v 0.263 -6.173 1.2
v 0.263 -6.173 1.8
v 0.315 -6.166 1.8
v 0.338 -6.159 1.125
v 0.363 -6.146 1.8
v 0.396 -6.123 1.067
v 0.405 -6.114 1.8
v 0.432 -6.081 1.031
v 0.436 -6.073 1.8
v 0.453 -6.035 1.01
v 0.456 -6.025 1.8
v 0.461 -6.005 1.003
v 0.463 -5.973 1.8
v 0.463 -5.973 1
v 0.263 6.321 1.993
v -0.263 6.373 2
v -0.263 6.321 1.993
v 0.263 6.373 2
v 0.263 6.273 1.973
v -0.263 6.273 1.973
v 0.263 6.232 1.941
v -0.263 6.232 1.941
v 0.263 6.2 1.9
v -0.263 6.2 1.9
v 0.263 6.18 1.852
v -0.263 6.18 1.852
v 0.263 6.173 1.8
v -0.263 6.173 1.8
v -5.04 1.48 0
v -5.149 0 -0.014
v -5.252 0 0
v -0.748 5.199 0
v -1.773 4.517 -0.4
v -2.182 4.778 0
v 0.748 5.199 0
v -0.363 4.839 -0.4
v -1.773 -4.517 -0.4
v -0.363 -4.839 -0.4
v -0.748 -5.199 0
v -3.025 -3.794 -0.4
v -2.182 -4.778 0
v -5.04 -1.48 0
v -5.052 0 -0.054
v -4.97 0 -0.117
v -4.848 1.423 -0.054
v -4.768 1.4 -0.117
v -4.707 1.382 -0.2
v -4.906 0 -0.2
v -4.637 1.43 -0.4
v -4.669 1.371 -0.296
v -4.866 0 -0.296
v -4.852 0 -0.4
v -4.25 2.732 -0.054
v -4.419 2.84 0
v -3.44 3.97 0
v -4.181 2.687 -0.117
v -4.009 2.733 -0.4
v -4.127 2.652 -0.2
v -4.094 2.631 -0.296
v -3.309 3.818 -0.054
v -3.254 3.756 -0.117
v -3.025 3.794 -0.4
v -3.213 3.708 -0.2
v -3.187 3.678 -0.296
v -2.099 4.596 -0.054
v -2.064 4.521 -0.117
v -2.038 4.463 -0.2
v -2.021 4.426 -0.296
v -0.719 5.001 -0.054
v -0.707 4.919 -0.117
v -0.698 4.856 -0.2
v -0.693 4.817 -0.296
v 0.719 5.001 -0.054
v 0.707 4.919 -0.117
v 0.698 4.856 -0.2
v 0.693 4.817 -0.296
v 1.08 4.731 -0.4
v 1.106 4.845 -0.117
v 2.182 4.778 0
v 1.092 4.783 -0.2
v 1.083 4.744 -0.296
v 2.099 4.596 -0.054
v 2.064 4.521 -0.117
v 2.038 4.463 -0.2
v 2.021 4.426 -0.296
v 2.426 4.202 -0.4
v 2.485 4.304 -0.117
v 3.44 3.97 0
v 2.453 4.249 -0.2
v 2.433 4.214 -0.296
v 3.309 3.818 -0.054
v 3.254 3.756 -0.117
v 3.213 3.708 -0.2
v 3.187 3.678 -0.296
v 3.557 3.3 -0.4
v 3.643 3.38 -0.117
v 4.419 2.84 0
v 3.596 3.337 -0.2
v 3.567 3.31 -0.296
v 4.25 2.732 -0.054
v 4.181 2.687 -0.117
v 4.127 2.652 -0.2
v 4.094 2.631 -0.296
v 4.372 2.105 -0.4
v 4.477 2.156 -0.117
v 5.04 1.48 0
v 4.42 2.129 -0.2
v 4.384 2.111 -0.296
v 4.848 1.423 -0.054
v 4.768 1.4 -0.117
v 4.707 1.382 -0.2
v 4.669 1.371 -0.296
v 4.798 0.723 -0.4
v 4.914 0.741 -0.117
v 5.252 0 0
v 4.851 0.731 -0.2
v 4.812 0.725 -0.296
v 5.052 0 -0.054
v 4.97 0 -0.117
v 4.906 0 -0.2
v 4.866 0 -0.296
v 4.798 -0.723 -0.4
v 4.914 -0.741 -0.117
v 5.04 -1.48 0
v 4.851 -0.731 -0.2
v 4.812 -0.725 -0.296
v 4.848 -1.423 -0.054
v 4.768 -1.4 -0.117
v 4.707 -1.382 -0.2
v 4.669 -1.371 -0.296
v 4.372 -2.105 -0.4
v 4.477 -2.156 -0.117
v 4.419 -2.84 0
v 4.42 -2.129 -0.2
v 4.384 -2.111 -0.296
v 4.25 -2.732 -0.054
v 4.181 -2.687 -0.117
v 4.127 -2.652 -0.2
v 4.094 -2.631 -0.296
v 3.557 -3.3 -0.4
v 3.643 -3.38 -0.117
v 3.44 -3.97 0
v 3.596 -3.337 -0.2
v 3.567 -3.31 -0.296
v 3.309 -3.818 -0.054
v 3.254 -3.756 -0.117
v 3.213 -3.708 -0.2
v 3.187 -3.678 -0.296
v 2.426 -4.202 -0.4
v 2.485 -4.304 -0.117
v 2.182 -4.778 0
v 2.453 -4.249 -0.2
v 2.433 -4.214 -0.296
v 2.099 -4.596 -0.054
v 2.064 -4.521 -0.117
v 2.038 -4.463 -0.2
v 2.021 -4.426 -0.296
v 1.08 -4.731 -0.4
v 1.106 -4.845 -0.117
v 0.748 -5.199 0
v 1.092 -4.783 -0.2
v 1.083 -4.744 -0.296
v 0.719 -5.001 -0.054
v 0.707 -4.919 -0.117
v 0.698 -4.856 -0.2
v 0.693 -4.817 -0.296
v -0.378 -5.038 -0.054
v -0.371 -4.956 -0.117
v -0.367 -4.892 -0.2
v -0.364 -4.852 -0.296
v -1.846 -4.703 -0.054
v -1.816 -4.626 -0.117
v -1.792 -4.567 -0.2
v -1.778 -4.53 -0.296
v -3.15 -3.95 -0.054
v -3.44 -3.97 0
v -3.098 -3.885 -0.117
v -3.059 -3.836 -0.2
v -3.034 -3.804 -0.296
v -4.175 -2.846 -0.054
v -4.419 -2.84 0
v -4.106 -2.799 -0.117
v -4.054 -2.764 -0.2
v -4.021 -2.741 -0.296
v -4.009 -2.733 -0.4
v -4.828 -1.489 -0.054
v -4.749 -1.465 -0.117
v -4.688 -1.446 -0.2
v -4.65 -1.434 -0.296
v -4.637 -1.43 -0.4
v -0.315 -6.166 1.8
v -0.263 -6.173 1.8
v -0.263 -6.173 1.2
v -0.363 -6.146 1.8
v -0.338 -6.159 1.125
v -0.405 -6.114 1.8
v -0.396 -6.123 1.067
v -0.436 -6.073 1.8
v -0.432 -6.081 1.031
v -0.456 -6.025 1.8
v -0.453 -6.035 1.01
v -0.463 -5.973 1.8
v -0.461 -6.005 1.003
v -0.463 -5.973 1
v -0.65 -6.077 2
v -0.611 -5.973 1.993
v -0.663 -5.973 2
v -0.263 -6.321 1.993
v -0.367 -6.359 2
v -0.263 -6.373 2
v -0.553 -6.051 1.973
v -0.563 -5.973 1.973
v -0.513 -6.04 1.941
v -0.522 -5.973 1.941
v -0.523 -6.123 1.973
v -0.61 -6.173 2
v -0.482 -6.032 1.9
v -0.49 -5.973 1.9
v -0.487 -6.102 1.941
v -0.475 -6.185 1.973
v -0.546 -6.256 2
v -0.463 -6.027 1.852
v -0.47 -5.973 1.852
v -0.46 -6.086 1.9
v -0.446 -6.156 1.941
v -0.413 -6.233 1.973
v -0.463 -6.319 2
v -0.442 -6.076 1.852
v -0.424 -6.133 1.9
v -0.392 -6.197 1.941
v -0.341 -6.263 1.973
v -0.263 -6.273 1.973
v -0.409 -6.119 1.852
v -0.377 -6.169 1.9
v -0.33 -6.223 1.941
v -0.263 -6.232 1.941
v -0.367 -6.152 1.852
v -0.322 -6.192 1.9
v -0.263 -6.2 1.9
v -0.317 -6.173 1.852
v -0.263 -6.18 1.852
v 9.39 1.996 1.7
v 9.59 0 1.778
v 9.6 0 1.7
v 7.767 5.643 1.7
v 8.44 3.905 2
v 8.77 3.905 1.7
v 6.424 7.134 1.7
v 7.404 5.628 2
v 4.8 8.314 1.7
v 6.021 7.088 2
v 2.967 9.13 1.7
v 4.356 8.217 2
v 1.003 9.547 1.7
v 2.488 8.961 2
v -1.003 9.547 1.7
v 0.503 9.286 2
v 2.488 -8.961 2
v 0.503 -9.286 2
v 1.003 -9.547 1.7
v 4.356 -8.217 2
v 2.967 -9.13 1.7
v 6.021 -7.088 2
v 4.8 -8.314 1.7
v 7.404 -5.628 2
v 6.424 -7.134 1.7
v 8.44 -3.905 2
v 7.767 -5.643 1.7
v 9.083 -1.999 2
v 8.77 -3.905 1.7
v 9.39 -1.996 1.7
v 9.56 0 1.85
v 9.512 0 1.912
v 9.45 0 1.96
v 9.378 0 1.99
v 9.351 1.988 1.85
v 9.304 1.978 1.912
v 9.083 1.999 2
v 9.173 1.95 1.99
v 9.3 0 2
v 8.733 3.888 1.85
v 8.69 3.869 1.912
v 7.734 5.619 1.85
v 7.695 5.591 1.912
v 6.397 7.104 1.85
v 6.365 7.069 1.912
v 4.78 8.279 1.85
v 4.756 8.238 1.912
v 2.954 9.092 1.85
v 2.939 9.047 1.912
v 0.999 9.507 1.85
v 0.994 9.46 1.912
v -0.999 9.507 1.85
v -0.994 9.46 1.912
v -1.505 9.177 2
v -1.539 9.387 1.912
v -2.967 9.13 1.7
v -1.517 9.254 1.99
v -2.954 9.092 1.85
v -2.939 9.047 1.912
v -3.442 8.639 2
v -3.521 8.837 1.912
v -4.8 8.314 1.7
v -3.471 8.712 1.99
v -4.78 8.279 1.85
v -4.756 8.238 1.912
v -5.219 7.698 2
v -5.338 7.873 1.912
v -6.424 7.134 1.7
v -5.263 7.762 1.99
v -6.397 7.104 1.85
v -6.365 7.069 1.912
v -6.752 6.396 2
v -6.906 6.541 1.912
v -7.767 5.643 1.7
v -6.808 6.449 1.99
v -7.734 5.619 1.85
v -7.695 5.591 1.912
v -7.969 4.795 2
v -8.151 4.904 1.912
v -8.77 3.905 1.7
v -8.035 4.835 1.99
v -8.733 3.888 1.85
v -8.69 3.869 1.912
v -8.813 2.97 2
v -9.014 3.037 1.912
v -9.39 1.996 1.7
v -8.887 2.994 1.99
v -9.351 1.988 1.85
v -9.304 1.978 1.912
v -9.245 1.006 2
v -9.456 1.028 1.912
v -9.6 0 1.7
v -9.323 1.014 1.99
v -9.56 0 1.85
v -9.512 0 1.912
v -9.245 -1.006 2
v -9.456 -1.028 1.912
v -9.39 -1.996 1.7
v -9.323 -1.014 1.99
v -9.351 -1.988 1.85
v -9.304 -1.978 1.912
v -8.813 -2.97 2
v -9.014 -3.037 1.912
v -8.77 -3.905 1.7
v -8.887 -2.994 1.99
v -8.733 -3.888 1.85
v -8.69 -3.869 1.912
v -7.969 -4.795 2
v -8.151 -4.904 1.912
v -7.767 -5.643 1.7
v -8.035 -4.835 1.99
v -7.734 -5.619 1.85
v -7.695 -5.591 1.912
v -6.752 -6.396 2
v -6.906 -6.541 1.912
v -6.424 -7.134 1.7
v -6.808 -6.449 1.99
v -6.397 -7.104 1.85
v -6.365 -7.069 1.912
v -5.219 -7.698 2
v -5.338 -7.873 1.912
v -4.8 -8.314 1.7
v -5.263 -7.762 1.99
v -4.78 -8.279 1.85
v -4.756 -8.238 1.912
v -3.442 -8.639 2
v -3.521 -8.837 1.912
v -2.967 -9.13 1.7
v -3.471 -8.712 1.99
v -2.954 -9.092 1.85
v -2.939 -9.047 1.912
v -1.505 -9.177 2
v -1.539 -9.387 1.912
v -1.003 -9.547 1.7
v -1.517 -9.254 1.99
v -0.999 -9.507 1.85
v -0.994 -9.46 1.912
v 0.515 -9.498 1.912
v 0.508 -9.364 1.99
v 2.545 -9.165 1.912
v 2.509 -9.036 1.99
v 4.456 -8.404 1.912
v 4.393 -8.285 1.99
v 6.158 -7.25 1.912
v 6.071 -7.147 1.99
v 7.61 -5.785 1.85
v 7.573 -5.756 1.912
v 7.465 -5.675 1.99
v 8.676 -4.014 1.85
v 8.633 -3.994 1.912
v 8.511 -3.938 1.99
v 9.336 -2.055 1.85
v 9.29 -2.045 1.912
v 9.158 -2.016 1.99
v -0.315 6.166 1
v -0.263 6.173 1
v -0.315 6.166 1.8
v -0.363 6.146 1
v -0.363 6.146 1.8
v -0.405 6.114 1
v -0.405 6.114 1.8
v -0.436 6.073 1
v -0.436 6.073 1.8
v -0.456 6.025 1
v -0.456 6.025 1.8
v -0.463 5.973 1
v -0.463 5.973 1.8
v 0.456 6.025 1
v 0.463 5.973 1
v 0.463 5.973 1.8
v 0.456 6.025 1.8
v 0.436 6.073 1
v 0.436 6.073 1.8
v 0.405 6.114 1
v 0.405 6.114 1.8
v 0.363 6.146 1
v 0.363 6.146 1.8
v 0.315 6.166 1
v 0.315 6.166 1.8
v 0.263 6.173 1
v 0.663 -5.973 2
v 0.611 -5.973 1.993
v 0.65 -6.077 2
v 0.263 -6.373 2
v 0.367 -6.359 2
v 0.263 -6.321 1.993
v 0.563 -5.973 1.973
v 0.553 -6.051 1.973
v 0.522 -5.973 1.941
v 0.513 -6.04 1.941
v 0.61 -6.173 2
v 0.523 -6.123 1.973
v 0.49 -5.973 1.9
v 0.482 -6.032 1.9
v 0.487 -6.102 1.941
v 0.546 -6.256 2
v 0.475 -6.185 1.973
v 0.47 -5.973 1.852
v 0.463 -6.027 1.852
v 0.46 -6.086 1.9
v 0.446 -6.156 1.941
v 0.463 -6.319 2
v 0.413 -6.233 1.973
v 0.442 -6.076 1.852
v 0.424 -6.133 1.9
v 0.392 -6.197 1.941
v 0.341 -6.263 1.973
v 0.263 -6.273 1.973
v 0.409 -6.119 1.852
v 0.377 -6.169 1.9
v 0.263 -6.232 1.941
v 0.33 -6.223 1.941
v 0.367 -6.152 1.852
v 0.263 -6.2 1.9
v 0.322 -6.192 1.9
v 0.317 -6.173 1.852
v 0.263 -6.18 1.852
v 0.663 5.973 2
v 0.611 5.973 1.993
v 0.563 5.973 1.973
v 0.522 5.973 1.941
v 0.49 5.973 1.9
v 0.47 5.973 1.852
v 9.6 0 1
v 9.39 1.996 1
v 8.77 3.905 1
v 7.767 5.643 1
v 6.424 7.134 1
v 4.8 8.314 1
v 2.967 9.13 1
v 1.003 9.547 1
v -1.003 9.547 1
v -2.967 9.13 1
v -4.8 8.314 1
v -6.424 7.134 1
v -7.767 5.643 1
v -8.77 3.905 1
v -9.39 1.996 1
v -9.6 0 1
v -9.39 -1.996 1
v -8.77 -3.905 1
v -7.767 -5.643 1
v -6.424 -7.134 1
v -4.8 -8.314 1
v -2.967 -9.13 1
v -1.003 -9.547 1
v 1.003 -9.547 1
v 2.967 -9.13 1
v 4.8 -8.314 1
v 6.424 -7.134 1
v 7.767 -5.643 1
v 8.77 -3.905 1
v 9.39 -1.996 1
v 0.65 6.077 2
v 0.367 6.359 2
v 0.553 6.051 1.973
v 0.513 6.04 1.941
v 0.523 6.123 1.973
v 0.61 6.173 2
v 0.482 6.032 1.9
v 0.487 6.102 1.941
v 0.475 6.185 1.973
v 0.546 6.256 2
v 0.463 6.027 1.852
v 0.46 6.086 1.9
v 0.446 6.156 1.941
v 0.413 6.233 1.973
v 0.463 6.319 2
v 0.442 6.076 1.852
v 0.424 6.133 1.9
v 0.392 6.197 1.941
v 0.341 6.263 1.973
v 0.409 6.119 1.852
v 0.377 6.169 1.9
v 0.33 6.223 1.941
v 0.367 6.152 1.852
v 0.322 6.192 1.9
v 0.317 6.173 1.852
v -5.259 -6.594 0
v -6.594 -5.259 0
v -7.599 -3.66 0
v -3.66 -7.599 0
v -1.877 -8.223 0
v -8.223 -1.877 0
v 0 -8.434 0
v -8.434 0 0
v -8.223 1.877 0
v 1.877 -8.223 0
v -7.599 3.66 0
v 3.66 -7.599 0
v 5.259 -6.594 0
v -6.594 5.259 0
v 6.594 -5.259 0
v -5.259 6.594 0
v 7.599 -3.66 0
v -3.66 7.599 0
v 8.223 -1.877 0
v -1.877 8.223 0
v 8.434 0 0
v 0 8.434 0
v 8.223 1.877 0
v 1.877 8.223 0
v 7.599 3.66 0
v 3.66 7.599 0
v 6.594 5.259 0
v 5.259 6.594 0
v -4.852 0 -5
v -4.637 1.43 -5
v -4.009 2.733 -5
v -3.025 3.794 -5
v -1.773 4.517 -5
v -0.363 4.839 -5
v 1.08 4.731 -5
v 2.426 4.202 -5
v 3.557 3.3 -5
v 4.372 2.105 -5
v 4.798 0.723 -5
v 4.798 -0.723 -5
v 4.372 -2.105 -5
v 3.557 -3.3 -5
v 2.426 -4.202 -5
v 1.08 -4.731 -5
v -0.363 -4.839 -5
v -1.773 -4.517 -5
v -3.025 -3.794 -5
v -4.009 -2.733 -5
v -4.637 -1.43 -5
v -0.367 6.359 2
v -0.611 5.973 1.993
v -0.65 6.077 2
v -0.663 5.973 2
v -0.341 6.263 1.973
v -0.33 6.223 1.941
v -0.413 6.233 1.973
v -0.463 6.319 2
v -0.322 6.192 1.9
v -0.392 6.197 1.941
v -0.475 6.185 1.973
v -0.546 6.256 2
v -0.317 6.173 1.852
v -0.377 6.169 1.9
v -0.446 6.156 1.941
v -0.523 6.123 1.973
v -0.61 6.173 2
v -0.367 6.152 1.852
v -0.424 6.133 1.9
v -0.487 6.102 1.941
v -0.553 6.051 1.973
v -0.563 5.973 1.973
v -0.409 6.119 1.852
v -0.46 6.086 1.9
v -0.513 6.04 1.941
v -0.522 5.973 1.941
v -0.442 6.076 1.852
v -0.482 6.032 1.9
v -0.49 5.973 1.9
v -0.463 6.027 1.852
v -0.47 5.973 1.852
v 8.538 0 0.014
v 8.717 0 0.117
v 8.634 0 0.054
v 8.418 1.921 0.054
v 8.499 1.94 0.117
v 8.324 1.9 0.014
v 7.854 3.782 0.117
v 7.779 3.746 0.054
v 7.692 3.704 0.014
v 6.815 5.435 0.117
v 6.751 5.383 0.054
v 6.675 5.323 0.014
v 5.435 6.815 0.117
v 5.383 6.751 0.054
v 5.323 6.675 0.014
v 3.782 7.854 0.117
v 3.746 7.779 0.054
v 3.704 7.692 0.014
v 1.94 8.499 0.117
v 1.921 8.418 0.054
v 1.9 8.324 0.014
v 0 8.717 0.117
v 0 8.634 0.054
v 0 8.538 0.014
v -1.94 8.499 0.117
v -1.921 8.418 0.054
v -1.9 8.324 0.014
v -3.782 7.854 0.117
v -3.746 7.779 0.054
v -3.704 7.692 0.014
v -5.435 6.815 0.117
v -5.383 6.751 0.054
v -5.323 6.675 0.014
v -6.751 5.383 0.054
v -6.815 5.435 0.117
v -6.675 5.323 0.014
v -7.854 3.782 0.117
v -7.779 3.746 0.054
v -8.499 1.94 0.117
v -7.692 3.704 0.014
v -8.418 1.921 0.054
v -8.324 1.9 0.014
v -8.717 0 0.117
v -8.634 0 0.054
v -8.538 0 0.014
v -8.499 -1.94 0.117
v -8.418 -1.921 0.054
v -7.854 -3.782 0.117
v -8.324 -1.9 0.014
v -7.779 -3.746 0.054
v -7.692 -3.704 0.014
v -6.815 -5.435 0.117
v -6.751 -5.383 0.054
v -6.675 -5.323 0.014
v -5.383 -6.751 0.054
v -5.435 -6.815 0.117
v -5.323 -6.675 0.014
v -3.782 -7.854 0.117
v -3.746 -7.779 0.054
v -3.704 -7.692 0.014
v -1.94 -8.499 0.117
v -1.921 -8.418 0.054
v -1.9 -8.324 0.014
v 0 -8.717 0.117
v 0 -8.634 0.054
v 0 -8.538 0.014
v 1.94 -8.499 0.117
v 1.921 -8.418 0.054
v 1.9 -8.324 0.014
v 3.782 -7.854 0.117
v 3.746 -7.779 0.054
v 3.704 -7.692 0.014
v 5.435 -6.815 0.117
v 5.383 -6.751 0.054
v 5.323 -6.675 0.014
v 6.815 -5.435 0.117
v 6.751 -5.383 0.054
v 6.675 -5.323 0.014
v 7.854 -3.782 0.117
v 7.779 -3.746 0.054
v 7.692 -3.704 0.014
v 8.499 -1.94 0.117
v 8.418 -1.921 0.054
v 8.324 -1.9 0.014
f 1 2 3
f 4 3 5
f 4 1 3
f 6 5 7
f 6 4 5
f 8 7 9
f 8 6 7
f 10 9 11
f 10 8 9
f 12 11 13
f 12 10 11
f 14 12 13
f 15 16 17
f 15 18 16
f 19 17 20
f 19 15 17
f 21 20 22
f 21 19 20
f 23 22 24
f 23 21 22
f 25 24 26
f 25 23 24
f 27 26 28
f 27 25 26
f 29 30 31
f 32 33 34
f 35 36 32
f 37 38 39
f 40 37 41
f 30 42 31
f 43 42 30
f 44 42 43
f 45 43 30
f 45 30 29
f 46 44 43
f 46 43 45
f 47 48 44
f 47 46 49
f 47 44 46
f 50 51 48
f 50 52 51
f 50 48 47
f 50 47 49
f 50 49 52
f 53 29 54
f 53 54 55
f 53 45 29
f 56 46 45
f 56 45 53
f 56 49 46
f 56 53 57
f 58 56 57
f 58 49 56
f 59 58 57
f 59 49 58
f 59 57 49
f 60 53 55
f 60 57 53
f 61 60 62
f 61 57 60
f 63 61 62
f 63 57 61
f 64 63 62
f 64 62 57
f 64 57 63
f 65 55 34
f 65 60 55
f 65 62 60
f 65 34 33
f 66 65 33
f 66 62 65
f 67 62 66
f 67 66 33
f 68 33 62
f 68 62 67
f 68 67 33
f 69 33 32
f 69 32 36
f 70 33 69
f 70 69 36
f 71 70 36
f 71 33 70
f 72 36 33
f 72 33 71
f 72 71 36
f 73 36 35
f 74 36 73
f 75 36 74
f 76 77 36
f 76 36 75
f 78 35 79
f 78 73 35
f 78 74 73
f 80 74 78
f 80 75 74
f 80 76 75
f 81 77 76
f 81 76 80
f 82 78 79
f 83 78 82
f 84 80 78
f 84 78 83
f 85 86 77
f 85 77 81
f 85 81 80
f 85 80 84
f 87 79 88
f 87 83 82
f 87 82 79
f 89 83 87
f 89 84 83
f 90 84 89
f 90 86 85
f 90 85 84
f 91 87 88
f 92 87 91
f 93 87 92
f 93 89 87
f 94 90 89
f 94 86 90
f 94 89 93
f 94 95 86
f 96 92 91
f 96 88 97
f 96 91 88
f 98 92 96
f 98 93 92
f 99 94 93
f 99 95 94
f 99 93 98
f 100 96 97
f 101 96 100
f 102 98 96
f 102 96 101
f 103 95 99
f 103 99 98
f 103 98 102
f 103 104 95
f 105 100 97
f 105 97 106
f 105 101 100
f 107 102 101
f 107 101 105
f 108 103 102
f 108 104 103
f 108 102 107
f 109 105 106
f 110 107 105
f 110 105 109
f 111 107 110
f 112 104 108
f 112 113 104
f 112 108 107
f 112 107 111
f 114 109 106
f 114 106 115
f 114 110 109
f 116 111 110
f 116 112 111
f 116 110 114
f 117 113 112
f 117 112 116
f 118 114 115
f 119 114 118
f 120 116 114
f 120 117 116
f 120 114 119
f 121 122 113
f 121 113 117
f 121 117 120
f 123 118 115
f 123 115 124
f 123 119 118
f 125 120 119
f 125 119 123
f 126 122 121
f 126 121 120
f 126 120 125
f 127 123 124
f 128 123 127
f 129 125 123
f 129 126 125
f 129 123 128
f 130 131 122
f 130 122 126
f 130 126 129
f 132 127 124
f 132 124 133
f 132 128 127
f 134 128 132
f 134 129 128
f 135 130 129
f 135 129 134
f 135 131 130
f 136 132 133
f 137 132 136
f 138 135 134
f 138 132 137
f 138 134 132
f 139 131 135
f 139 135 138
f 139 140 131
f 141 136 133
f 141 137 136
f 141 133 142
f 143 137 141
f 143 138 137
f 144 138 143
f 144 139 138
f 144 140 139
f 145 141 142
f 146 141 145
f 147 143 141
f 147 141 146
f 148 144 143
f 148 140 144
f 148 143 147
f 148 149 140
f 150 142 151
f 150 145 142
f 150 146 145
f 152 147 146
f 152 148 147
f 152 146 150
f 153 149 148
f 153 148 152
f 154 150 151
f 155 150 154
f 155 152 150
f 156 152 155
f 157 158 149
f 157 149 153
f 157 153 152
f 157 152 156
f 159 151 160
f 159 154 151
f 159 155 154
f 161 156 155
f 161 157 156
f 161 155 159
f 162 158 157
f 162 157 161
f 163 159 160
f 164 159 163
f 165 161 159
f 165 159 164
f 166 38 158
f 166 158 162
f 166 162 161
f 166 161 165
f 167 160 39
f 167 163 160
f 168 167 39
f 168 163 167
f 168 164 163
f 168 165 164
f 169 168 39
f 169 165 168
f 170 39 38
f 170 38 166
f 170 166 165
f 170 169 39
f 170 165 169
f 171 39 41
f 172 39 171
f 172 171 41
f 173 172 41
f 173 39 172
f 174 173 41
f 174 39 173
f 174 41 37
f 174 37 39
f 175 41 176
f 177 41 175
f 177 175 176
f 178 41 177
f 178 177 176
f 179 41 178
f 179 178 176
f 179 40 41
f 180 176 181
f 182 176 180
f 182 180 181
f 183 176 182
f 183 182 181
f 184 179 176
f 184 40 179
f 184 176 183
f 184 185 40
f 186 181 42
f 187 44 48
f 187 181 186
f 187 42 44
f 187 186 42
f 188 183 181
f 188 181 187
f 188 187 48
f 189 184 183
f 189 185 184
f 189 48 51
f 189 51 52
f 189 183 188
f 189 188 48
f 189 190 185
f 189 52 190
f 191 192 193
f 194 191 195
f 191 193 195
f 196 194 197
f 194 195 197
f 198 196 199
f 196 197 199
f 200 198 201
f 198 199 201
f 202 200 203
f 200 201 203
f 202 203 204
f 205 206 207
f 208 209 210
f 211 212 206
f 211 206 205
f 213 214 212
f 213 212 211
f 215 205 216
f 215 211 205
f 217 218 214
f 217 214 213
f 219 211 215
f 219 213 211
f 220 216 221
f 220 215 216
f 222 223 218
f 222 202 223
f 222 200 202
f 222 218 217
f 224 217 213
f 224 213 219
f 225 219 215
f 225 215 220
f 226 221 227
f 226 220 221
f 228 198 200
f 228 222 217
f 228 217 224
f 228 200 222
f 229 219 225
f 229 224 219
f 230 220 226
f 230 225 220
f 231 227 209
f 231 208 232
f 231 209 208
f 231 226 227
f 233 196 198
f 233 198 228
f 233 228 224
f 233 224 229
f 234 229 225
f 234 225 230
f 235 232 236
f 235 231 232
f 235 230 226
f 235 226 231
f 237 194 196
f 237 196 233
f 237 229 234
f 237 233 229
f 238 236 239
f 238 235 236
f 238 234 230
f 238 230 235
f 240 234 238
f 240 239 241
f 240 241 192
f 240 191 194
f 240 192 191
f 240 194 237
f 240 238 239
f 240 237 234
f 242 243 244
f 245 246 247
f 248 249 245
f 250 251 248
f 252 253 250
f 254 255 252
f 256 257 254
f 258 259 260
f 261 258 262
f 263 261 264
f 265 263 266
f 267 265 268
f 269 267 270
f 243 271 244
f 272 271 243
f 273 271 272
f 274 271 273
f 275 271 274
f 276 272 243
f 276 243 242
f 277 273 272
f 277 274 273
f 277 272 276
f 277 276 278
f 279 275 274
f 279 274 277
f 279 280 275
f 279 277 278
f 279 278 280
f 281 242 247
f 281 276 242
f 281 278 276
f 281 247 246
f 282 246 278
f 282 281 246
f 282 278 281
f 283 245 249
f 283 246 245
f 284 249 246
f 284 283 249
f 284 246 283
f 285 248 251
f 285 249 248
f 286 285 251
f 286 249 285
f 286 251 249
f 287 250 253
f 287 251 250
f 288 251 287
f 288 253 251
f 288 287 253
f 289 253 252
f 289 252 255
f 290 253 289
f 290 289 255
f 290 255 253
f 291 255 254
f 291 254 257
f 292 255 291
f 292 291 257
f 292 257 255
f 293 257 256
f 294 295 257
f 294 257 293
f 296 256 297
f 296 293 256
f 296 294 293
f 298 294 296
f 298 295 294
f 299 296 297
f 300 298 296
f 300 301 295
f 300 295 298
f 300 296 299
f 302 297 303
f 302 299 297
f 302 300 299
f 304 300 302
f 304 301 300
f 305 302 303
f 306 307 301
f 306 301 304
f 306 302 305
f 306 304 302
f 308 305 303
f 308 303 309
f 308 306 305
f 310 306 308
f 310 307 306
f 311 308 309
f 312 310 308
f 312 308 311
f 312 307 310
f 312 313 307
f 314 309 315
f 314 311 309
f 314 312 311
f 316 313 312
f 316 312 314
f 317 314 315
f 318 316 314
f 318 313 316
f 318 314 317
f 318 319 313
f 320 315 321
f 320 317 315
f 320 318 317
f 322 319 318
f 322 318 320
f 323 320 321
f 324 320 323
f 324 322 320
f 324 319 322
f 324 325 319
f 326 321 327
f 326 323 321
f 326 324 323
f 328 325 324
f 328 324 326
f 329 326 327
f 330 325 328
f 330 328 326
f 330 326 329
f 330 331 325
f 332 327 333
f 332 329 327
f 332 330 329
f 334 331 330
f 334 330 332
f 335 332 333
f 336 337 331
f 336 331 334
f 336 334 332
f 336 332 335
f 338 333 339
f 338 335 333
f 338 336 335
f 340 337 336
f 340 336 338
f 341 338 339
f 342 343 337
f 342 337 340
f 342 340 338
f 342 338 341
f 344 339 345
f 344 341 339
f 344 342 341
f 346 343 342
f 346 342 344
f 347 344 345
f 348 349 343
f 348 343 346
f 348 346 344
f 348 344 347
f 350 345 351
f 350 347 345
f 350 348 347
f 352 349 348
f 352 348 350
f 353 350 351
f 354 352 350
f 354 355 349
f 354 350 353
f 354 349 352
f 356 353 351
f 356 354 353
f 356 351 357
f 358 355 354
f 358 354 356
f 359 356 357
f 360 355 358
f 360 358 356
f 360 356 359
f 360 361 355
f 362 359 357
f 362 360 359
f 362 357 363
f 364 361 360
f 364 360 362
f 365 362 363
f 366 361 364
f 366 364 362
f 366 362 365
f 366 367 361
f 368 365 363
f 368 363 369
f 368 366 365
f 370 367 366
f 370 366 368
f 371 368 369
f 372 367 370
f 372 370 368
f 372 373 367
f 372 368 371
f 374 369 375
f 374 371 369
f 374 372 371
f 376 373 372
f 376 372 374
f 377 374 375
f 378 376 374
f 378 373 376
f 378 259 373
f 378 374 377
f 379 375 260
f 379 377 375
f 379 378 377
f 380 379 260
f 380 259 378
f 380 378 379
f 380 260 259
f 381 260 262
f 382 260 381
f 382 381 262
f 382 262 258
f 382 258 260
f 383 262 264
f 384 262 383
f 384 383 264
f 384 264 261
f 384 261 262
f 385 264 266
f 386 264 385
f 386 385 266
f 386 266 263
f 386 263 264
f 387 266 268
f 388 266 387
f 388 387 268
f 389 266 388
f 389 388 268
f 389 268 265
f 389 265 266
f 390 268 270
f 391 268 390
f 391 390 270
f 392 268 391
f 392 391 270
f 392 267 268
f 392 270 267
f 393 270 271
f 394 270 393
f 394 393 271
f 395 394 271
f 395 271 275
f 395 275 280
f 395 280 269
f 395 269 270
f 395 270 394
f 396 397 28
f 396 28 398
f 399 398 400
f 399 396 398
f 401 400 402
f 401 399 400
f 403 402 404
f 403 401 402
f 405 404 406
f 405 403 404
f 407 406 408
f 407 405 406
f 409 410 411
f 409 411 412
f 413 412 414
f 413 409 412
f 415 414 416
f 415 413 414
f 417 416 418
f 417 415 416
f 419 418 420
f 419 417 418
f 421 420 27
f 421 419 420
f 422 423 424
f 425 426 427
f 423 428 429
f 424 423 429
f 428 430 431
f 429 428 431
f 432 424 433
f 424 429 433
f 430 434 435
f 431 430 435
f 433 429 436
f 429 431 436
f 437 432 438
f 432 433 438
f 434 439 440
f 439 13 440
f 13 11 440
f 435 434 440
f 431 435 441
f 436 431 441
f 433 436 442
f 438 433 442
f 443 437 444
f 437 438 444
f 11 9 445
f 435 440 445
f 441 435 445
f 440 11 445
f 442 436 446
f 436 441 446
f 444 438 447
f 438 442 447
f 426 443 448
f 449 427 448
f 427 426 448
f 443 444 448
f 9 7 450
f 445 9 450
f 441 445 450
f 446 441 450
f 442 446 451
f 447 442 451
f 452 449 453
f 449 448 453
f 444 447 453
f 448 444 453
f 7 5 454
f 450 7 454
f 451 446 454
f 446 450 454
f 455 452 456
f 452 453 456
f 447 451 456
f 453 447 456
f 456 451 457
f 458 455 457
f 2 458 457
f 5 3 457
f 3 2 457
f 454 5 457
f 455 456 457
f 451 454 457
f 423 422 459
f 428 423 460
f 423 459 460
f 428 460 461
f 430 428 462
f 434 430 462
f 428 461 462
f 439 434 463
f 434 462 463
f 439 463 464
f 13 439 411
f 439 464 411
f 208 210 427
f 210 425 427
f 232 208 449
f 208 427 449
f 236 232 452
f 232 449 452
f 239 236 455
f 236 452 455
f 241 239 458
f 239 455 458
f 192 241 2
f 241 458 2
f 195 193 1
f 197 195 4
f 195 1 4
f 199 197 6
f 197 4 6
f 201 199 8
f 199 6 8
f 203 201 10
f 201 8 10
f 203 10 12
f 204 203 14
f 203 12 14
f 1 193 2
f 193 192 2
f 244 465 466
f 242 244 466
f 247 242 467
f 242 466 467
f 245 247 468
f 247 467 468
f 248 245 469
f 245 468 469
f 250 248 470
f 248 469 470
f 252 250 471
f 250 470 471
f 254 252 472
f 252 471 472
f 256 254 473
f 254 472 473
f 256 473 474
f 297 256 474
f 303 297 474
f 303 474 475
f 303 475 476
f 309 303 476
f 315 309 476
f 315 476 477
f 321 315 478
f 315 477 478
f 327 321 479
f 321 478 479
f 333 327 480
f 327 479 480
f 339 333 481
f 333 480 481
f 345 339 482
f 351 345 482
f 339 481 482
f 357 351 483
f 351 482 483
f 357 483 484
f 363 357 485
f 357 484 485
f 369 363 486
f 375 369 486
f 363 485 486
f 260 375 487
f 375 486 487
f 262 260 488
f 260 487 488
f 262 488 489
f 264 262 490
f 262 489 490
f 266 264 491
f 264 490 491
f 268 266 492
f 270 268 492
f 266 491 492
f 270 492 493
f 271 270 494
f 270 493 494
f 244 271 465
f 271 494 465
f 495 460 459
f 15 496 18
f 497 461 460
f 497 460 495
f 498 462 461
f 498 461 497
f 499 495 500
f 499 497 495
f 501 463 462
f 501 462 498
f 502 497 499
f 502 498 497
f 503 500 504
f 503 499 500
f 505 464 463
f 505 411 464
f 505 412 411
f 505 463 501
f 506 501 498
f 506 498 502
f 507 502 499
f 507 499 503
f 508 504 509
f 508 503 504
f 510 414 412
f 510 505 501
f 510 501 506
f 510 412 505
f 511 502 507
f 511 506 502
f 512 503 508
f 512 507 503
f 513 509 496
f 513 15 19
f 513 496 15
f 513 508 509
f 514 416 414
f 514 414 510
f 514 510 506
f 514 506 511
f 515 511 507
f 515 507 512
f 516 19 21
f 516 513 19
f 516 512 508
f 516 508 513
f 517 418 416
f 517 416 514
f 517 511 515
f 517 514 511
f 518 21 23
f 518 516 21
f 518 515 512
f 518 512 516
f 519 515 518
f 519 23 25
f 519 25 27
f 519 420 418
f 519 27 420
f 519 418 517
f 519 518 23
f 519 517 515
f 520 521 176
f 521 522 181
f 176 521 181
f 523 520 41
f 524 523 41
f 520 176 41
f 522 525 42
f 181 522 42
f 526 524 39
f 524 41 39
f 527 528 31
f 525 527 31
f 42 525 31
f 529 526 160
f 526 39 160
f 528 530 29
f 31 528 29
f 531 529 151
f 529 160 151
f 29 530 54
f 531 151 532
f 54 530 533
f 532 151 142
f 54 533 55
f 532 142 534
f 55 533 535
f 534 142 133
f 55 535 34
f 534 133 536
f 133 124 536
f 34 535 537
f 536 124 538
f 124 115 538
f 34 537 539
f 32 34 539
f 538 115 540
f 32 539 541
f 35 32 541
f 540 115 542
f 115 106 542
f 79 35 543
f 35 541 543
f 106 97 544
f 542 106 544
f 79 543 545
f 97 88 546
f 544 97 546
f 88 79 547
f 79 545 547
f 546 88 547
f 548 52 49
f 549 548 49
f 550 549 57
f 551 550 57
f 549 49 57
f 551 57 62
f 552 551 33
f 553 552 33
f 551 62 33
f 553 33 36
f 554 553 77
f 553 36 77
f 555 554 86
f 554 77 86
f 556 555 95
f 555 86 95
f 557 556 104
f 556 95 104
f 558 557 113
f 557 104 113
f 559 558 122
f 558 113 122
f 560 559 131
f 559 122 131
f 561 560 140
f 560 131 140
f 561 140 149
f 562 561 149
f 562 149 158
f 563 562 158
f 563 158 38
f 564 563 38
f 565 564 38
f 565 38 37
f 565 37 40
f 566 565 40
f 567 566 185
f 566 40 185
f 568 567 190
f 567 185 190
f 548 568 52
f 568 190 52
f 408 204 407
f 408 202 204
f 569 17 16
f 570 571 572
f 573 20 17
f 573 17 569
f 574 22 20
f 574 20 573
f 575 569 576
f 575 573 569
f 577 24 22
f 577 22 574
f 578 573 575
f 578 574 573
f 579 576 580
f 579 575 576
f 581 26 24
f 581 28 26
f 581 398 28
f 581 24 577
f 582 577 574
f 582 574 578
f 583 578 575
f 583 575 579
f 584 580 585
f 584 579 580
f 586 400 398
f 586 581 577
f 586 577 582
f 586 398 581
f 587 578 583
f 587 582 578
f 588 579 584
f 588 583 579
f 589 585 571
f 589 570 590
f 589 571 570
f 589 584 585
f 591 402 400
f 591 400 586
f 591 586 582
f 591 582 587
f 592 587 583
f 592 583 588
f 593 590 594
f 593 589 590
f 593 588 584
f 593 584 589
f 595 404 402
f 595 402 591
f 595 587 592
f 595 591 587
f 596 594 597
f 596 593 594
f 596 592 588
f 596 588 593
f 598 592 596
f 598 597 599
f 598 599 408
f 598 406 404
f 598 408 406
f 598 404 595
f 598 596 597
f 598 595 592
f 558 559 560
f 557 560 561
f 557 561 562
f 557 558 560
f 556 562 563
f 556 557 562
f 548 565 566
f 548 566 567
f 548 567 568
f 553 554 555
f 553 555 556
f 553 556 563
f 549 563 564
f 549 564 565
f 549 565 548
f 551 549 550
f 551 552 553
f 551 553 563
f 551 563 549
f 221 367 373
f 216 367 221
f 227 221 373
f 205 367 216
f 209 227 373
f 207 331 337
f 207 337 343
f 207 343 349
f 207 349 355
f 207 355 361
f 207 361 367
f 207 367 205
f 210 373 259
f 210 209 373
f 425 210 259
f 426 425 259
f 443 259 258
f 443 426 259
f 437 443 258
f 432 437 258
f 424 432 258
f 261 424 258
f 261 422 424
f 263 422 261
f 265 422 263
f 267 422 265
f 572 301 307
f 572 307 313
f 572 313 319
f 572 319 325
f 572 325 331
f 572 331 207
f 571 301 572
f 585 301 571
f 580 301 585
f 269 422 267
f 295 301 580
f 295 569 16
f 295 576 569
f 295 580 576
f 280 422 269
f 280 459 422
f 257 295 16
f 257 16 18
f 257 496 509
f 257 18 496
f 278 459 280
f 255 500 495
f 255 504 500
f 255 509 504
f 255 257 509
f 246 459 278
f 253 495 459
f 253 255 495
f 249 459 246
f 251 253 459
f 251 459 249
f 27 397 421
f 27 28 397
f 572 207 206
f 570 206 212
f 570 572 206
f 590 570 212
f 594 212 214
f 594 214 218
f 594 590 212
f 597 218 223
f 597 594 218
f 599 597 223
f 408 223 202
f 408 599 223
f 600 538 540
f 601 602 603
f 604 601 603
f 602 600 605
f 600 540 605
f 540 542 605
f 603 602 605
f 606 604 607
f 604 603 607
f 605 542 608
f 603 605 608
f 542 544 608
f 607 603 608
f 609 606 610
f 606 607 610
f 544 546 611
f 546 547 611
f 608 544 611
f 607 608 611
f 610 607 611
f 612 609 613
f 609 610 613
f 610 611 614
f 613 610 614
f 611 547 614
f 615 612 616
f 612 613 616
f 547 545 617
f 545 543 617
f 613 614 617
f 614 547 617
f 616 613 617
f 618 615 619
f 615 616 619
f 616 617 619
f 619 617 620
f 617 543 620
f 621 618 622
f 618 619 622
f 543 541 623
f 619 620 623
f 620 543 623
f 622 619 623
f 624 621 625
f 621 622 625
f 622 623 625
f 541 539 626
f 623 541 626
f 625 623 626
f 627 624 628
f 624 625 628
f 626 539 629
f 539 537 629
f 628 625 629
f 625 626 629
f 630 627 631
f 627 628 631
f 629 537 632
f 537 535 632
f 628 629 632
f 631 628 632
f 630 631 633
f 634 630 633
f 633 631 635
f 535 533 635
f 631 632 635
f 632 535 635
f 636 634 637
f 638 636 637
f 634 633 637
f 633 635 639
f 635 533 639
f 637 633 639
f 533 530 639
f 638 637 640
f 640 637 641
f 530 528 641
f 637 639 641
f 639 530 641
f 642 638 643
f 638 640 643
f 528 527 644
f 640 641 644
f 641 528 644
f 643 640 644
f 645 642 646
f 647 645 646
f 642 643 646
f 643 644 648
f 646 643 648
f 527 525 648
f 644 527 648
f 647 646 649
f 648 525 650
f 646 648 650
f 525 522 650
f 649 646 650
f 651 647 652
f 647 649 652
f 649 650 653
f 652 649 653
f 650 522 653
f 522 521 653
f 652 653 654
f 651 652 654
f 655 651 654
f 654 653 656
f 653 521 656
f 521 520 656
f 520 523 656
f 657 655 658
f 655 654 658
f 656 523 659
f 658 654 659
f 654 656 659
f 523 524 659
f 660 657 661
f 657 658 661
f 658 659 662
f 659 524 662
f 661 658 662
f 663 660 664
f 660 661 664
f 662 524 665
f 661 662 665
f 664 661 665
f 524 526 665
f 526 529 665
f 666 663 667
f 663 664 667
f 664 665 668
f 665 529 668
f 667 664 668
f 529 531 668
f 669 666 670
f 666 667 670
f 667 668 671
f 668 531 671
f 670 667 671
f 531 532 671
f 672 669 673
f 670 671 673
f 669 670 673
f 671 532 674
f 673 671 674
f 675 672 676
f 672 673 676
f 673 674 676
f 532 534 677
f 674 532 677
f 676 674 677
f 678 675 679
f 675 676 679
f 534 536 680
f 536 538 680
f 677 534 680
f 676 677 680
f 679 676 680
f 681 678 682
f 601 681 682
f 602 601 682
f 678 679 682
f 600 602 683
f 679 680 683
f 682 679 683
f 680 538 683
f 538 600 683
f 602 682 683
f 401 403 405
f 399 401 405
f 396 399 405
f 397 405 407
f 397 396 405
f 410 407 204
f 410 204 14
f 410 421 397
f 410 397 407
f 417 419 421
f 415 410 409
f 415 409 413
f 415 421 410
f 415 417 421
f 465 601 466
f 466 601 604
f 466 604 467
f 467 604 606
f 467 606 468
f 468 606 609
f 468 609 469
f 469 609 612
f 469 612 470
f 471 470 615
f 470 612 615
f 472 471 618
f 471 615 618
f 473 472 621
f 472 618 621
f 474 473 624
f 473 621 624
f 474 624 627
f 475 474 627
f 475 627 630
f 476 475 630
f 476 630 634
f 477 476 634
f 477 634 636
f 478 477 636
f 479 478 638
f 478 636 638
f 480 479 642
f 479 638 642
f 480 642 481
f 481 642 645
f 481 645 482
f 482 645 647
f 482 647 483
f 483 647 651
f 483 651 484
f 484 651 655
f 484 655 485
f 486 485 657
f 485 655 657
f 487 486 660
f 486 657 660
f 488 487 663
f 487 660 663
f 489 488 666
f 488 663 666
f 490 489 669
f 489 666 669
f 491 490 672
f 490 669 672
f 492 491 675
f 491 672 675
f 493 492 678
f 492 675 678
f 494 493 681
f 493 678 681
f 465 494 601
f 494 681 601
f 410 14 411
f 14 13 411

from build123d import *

# Parameters (mm, degrees)
SKETCH1_R           = 9.6
BOSS_EXTRUDE2_DEPTH = 2
CHAMFER1_SIZE       = 1
FILLET1_R           = 0.3
SKETCH2_W           = 0.926275652
SKETCH2_H           = 12.346112468
CUT_EXTRUDE1_DEPTH  = 1
FILLET2_R           = 0.2
SKETCH5_R           = 4.852441015
BOSS_EXTRUDE3_DEPTH = 5
FILLET3_R           = 0.4


with BuildPart() as part:
    # Sketch1 → Boss-Extrude2 (new body)
    with BuildSketch(Plane.XY):
        Circle(SKETCH1_R)
    extrude(amount=BOSS_EXTRUDE2_DEPTH)

    # Chamfer1
    chamfer1_edges = [part.edges().sort_by_distance(p)[0] for p in [
        (-9.6, 0, 0),
    ]]
    chamfer(chamfer1_edges, length=CHAMFER1_SIZE)

    # Fillet1
    fillet1_edges = [part.edges().sort_by_distance(p)[0] for p in [
        (-9.6, 0, 2),
    ]]
    fillet(fillet1_edges, radius=FILLET1_R)

    # Sketch2 → Cut-Extrude1 (cut)
    with BuildSketch(Plane.XY.offset(2)):
        Rectangle(SKETCH2_W, SKETCH2_H)
    extrude(amount=-CUT_EXTRUDE1_DEPTH, mode=Mode.SUBTRACT)

    # Fillet2
    fillet2_edges = [part.edges().sort_by_distance(p)[0] for p in [
        (0.463137826, 6.173056234, 1.5),
        (0, -6.173056234, 1),
        (0.463137826, -6.173056234, 1.5),
        (-0.463137826, -6.173056234, 1.5),
        (-0.463137826, 6.173056234, 1.5),
        (0.463137826, 0, 2),
        (0, 6.173056234, 2),
        (-0.463137826, 0, 2),
        (0, -6.173056234, 2),
    ]]
    fillet(fillet2_edges, radius=FILLET2_R)

    # Sketch5 → Boss-Extrude3 (add)
    with BuildSketch(Plane(origin=(0, 0, 0), x_dir=(-1, 0, 0), z_dir=(0, 0, -1))):
        Circle(SKETCH5_R)
    extrude(amount=BOSS_EXTRUDE3_DEPTH)

    # Fillet3
    fillet3_edges = [part.edges().sort_by_distance(p)[0] for p in [
        (4.852441015, 0, 0),
        (-8.6, 0, 0),
    ]]
    fillet(fillet3_edges, radius=FILLET3_R)


solid = part.part
